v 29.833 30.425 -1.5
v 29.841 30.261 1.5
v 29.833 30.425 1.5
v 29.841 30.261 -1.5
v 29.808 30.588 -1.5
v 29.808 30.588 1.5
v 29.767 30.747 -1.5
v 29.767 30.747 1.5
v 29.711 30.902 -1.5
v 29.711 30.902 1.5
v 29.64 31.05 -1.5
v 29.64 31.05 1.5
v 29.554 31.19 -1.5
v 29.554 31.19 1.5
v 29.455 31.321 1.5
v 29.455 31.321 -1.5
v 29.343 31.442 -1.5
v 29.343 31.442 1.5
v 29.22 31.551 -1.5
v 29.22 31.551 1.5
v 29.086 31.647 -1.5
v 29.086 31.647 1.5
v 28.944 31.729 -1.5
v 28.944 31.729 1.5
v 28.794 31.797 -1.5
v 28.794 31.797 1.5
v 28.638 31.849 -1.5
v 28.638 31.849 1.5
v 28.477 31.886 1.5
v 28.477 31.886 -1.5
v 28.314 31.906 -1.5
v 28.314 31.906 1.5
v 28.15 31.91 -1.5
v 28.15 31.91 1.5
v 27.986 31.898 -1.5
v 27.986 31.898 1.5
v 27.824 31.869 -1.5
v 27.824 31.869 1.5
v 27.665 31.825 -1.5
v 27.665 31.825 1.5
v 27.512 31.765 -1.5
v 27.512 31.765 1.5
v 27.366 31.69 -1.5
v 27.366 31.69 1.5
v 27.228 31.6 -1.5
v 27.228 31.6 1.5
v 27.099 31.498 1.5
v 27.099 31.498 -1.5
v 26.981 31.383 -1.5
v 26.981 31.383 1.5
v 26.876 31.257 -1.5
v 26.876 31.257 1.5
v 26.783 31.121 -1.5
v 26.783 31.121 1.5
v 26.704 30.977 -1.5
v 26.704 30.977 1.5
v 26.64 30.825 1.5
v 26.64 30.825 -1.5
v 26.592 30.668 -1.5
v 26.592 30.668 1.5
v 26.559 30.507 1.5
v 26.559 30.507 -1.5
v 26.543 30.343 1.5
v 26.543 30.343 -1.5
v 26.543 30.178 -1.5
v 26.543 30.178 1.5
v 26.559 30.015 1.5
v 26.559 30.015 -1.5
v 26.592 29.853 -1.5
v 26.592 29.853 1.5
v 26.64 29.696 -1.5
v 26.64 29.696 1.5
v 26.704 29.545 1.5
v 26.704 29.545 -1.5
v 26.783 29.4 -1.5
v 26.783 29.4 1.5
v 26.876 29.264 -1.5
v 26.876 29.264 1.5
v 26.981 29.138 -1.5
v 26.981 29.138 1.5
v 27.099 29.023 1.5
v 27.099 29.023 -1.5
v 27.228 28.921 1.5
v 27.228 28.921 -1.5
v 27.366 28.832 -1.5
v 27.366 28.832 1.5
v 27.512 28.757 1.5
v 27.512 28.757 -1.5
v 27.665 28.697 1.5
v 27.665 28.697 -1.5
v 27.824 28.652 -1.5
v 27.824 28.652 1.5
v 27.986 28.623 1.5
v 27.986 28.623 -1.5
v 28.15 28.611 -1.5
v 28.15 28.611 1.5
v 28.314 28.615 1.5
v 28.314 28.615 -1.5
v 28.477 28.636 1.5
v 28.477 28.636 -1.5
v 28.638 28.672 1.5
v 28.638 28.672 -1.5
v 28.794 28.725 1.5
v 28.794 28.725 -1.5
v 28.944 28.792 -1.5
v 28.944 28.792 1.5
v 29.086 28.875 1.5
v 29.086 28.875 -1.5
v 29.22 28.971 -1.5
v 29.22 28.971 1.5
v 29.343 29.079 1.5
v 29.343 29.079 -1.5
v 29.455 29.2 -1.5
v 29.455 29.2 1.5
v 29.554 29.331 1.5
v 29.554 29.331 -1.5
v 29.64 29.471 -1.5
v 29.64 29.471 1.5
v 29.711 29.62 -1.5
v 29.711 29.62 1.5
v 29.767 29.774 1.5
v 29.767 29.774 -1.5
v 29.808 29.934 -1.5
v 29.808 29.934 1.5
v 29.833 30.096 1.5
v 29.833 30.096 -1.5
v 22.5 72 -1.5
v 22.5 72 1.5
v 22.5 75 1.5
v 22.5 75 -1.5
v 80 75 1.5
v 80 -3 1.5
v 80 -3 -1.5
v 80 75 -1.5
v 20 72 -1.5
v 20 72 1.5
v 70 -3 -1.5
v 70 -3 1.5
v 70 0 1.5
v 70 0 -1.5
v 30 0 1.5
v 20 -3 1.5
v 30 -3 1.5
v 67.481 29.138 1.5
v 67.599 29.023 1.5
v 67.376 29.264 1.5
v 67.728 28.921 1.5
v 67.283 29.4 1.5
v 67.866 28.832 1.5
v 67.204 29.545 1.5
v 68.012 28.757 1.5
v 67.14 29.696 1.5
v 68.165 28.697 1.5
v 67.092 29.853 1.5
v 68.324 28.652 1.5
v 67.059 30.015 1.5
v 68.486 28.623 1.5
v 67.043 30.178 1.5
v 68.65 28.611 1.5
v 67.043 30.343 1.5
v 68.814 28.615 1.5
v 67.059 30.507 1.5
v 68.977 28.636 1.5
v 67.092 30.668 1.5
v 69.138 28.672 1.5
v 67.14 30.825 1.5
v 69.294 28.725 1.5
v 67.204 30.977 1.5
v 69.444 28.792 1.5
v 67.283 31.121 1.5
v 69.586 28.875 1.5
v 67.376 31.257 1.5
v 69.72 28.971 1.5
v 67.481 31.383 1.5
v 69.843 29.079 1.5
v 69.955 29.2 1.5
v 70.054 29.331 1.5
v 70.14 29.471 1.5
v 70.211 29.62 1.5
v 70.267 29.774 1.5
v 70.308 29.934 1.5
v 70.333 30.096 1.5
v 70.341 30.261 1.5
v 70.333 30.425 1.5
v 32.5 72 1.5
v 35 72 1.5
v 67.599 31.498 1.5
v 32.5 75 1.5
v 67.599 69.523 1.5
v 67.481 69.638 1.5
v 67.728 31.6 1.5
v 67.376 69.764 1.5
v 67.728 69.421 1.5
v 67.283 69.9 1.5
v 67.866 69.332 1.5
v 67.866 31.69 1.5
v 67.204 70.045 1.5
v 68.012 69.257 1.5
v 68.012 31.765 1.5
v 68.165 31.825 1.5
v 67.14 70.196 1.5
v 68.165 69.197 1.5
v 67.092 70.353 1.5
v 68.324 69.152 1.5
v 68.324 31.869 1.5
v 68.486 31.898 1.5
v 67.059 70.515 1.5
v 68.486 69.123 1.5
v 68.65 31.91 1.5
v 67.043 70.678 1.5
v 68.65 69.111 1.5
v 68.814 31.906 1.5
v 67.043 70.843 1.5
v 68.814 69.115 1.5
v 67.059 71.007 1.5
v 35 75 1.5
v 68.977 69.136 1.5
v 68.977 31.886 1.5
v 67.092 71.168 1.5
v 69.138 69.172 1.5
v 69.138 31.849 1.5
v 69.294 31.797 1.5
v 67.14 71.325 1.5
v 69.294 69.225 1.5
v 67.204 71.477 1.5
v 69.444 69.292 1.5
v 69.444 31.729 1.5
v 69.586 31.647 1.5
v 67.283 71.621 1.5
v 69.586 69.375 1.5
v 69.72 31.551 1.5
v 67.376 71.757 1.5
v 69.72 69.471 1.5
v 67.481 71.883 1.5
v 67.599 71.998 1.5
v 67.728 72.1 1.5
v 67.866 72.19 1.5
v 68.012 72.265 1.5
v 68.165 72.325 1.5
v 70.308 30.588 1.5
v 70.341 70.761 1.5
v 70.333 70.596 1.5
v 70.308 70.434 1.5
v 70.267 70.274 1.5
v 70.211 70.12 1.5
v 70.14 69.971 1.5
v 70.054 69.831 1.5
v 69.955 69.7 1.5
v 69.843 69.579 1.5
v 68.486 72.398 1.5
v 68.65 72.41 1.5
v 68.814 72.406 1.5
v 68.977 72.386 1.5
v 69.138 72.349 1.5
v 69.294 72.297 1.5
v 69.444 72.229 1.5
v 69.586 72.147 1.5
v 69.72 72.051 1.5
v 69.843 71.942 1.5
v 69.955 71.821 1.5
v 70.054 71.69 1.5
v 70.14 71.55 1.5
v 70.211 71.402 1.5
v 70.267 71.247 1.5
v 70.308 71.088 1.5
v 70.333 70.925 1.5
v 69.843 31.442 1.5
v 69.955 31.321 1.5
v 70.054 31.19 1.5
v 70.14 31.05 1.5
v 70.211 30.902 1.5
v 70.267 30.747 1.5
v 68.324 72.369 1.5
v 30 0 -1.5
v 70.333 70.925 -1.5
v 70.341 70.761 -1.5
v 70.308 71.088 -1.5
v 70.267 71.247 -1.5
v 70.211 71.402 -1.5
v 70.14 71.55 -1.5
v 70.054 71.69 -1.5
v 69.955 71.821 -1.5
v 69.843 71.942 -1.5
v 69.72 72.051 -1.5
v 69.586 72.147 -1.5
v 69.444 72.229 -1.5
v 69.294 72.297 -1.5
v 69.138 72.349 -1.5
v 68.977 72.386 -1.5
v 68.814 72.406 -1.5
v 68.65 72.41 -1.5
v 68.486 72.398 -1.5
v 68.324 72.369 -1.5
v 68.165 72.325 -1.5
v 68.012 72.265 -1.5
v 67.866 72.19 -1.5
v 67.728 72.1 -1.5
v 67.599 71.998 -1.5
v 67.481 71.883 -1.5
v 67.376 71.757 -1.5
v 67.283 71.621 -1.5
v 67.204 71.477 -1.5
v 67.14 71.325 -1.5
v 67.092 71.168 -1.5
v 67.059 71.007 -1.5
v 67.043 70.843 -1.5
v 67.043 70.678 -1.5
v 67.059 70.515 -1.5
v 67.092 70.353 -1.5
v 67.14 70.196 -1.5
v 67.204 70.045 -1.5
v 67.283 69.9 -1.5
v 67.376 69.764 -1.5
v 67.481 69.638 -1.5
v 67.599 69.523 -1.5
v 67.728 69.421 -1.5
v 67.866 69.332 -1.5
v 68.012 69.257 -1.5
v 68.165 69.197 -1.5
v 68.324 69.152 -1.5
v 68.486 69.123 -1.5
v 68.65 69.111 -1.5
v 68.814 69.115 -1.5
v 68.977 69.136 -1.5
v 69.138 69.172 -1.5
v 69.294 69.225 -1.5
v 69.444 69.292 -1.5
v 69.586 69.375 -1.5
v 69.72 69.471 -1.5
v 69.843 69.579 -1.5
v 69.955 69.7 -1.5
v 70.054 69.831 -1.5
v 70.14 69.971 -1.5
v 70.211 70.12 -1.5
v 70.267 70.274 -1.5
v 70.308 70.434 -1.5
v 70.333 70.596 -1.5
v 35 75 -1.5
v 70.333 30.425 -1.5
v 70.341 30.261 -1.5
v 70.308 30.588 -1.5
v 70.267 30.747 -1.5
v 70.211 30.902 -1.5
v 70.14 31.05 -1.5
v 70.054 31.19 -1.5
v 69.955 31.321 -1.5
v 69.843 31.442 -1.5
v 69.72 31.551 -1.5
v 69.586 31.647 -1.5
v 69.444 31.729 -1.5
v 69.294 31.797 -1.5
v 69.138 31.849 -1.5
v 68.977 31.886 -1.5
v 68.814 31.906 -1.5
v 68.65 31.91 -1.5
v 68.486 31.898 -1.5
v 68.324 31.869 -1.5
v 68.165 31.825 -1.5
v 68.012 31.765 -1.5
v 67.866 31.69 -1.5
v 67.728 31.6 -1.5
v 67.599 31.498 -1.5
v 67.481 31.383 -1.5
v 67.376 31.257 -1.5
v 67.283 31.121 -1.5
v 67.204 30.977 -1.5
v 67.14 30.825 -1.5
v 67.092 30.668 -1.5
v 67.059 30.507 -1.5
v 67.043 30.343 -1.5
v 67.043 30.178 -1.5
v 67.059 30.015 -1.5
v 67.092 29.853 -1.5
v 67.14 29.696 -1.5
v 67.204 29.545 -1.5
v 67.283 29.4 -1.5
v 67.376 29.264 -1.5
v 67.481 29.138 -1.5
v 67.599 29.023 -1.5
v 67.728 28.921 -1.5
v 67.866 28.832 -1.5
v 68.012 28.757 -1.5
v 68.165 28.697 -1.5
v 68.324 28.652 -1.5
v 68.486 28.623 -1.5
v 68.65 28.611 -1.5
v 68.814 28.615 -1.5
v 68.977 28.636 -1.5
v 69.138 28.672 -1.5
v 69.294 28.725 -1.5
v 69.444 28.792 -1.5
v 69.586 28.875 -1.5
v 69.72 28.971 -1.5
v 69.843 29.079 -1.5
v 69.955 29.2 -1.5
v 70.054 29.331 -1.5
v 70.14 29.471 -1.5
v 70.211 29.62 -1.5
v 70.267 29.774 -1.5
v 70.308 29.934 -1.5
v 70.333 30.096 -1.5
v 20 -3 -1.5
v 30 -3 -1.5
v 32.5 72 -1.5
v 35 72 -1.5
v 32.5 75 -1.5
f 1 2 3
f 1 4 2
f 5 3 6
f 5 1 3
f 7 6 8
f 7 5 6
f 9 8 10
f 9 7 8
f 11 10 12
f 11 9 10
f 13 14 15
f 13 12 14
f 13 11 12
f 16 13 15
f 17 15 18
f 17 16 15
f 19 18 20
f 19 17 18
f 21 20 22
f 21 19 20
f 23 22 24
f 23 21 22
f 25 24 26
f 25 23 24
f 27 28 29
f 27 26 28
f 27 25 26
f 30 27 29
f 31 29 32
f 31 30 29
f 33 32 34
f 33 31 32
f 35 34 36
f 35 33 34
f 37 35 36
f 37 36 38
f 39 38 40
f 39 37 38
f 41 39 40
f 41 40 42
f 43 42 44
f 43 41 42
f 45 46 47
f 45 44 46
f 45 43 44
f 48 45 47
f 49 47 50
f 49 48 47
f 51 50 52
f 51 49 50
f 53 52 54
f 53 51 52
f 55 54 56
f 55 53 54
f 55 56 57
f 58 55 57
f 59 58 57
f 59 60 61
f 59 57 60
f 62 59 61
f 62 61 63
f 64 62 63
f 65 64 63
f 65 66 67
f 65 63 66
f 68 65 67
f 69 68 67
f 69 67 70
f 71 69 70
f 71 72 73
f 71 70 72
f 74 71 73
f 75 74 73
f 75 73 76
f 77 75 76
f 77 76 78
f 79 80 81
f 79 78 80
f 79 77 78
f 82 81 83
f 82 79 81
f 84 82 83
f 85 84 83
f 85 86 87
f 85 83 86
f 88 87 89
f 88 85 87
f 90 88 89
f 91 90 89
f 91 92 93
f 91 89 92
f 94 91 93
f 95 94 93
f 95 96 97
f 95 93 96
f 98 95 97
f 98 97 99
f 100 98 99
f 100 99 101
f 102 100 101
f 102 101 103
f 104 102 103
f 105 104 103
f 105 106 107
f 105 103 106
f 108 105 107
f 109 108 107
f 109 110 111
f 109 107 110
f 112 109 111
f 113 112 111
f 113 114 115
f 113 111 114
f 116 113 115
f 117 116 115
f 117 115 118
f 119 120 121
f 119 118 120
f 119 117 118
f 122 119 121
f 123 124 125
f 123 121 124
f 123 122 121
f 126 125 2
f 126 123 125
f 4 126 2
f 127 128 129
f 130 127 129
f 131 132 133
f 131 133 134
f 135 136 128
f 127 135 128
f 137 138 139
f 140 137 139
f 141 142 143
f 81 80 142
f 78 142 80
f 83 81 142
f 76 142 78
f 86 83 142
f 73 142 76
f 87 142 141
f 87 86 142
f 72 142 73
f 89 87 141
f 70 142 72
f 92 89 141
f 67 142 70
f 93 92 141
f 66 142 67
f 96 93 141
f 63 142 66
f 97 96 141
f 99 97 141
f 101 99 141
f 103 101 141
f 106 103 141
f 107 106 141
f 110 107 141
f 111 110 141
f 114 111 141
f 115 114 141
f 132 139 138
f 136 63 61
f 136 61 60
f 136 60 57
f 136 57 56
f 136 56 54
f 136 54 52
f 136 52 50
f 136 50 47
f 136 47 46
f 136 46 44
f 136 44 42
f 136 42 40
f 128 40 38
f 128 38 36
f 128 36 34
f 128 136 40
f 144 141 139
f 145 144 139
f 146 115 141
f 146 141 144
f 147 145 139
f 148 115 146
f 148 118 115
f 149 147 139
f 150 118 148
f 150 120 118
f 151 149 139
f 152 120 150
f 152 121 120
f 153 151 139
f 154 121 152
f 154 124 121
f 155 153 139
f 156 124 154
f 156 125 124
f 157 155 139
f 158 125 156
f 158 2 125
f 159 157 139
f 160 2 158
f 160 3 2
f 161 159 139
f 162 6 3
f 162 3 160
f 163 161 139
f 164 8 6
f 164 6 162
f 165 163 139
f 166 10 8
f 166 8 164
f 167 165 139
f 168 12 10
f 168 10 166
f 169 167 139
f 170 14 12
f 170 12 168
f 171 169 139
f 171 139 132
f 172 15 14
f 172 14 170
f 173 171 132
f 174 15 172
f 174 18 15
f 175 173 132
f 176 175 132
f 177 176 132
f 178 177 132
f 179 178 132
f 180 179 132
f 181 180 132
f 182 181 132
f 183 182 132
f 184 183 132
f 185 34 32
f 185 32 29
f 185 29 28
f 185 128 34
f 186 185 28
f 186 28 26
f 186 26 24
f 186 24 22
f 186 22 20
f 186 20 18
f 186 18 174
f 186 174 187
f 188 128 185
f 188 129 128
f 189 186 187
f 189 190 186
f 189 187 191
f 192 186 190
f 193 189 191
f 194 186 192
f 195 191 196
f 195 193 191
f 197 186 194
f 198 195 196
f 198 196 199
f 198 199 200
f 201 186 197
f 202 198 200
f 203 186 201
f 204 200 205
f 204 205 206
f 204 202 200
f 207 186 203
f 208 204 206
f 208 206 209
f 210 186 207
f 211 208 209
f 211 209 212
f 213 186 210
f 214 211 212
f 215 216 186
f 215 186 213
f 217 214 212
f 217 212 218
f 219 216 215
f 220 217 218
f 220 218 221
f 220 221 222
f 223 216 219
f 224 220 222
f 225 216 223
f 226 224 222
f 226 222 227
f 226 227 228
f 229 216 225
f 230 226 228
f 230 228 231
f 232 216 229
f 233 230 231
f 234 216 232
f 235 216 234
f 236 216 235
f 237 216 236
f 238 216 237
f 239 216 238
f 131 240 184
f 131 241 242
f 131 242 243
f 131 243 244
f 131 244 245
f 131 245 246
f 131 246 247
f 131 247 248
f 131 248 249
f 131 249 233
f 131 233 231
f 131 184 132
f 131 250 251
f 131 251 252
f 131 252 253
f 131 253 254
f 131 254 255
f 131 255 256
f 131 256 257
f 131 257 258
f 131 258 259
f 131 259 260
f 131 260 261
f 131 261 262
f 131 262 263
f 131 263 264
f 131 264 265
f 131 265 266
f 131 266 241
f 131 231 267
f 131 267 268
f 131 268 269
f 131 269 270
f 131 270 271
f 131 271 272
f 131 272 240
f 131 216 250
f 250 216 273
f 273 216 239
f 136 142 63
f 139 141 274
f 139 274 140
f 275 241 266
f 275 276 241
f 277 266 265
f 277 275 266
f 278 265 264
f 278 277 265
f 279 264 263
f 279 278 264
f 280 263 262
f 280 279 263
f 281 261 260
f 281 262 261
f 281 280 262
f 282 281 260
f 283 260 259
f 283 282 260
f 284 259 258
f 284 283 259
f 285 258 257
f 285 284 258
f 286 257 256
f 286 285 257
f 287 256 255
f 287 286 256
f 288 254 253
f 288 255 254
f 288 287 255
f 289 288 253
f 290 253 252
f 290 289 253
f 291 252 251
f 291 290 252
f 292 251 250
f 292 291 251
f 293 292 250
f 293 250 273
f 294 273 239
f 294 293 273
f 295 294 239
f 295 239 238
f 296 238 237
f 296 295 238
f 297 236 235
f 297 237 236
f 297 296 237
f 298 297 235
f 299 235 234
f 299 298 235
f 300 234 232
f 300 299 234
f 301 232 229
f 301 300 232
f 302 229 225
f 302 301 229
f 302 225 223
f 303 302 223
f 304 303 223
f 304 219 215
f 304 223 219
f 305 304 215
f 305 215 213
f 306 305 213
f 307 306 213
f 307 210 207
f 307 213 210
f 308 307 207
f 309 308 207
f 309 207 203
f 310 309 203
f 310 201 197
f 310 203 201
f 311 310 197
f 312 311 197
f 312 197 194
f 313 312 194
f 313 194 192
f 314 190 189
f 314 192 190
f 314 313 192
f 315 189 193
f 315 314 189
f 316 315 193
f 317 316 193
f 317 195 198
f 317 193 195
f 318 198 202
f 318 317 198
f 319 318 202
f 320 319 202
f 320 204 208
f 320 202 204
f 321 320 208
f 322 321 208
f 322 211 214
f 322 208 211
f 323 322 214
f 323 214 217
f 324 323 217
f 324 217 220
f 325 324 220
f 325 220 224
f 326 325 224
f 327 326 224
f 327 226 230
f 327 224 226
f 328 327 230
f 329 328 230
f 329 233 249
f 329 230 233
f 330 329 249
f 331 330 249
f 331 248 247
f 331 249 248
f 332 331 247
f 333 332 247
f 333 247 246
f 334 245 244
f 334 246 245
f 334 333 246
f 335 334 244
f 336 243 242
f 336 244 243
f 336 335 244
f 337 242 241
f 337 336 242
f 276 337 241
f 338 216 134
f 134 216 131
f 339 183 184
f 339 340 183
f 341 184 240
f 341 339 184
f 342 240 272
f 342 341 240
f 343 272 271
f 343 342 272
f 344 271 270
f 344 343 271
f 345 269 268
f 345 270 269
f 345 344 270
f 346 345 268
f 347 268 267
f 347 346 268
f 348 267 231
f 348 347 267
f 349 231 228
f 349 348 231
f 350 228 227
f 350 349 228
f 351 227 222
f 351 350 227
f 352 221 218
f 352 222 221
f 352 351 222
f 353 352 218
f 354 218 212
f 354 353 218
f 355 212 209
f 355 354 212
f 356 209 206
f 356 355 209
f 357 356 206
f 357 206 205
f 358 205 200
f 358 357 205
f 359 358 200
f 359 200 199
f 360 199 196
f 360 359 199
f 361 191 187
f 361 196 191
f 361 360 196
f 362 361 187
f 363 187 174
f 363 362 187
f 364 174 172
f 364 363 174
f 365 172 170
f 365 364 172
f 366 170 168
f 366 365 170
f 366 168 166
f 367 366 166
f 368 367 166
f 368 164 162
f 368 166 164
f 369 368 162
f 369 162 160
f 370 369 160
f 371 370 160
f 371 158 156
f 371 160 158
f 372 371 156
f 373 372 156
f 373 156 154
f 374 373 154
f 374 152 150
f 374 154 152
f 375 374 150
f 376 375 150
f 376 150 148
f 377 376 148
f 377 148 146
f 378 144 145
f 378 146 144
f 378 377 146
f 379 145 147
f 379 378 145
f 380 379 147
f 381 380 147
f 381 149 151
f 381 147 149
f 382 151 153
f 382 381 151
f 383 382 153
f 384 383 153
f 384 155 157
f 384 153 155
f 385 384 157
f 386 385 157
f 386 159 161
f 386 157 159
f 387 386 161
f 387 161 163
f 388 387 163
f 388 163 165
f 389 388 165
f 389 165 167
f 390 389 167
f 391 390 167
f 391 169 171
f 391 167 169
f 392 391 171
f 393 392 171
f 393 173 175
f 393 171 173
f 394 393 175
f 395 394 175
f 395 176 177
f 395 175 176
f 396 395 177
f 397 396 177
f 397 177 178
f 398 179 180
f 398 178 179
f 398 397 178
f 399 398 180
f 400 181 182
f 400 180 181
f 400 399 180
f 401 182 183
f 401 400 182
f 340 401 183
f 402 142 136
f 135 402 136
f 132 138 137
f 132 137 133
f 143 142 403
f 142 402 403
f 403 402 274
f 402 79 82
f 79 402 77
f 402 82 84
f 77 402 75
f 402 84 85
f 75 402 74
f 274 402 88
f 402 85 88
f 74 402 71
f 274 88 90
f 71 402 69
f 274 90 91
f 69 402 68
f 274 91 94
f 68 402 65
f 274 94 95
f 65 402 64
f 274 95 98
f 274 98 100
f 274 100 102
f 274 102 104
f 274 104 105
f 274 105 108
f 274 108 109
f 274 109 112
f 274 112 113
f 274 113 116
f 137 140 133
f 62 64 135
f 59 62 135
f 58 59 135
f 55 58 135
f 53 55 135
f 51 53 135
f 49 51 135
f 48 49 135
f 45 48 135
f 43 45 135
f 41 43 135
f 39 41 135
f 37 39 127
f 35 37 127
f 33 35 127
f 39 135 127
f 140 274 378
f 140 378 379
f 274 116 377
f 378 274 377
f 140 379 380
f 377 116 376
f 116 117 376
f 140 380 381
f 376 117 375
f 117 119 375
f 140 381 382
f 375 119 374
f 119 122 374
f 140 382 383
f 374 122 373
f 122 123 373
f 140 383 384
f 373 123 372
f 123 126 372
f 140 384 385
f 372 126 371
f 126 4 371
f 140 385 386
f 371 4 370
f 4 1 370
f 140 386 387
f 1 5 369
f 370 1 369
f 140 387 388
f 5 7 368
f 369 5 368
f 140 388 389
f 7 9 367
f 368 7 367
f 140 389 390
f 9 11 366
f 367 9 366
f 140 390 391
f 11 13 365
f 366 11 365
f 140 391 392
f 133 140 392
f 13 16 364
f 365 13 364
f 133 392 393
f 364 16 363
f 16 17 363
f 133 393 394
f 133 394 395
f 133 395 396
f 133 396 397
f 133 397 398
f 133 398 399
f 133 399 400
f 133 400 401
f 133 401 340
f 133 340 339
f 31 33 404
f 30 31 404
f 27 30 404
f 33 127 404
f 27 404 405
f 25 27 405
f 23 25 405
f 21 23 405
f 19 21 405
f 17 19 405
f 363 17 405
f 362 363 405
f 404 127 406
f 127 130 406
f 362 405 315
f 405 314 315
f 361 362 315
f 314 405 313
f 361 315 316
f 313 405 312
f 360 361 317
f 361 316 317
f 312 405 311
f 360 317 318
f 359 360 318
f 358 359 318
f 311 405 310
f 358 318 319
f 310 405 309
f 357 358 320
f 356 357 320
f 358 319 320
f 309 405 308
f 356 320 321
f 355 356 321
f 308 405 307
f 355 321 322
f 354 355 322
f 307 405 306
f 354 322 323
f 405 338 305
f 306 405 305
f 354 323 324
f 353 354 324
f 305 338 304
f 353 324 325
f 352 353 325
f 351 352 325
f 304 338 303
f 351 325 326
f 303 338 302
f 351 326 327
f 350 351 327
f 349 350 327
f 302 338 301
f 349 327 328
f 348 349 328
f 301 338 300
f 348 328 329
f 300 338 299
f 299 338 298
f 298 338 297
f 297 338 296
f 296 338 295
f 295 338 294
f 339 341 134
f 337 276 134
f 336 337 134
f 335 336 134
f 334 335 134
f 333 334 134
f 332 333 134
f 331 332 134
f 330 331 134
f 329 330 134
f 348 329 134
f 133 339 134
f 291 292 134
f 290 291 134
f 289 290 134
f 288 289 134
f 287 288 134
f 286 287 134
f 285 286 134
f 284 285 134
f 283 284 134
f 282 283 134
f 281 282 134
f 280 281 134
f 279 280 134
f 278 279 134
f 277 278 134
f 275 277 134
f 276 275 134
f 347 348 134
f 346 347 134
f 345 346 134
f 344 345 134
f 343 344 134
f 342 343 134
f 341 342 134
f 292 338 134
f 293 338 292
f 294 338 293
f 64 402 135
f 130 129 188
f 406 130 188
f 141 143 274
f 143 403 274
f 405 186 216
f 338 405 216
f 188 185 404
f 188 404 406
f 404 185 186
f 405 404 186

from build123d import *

# Parameters (mm, degrees)
SKETCH1_W              = 60
SKETCH1_H              = 75
MAINBODY_DEPTH         = 1.5
SHAFT_HOLES_DEPTH      = 110.668819634
SHAFT_HOLES_DEPTH_BACK = 110.668819634
SKETCH3_R              = 1.65
SKETCH4_W              = 10
SKETCH4_H              = 3
BASETABS_DEPTH         = 1.5
SKETCH5_W              = 2.5
SKETCH5_H              = 3
CUT_EXTRUDE2_DEPTH     = 110.69958979


with BuildPart() as part:
    # Sketch1 → MainBody (new, symmetric)
    with BuildSketch(Plane.XY):
        with Locations((50, 37.5)):
            Rectangle(SKETCH1_W, SKETCH1_H)
    extrude(amount=MAINBODY_DEPTH, both=True)

    # Sketch3 → Shaft Holes (cut, two sides: drawn at the far end of the back side and taken through both)
    with BuildSketch(Plane.XY.offset(-SHAFT_HOLES_DEPTH_BACK)):
        with Locations((28.190778624, 30.2606043)):
            Circle(SKETCH3_R)
        with Locations((68.690778624, 30.2606043)):
            Circle(SKETCH3_R)
        with Locations((68.690778624, 70.7606043)):
            Circle(SKETCH3_R)
    extrude(amount=SHAFT_HOLES_DEPTH + SHAFT_HOLES_DEPTH_BACK, mode=Mode.SUBTRACT)

    # Sketch4 → BaseTabs (add, symmetric)
    with BuildSketch(Plane.XY):
        with Locations((25, -1.5)):
            Rectangle(SKETCH4_W, SKETCH4_H)
        with Locations((75, -1.5)):
            Rectangle(SKETCH4_W, SKETCH4_H)
    extrude(amount=BASETABS_DEPTH, both=True)

    # Sketch5 → Cut-Extrude2 (cut, through all)
    with BuildSketch(Plane.XY.offset(1.5)):
        with Locations((21.25, 73.5)):
            Rectangle(SKETCH5_W, SKETCH5_H)
        with Locations((33.75, 73.5)):
            Rectangle(SKETCH5_W, SKETCH5_H)
    extrude(amount=-CUT_EXTRUDE2_DEPTH, mode=Mode.SUBTRACT)


solid = part.part
